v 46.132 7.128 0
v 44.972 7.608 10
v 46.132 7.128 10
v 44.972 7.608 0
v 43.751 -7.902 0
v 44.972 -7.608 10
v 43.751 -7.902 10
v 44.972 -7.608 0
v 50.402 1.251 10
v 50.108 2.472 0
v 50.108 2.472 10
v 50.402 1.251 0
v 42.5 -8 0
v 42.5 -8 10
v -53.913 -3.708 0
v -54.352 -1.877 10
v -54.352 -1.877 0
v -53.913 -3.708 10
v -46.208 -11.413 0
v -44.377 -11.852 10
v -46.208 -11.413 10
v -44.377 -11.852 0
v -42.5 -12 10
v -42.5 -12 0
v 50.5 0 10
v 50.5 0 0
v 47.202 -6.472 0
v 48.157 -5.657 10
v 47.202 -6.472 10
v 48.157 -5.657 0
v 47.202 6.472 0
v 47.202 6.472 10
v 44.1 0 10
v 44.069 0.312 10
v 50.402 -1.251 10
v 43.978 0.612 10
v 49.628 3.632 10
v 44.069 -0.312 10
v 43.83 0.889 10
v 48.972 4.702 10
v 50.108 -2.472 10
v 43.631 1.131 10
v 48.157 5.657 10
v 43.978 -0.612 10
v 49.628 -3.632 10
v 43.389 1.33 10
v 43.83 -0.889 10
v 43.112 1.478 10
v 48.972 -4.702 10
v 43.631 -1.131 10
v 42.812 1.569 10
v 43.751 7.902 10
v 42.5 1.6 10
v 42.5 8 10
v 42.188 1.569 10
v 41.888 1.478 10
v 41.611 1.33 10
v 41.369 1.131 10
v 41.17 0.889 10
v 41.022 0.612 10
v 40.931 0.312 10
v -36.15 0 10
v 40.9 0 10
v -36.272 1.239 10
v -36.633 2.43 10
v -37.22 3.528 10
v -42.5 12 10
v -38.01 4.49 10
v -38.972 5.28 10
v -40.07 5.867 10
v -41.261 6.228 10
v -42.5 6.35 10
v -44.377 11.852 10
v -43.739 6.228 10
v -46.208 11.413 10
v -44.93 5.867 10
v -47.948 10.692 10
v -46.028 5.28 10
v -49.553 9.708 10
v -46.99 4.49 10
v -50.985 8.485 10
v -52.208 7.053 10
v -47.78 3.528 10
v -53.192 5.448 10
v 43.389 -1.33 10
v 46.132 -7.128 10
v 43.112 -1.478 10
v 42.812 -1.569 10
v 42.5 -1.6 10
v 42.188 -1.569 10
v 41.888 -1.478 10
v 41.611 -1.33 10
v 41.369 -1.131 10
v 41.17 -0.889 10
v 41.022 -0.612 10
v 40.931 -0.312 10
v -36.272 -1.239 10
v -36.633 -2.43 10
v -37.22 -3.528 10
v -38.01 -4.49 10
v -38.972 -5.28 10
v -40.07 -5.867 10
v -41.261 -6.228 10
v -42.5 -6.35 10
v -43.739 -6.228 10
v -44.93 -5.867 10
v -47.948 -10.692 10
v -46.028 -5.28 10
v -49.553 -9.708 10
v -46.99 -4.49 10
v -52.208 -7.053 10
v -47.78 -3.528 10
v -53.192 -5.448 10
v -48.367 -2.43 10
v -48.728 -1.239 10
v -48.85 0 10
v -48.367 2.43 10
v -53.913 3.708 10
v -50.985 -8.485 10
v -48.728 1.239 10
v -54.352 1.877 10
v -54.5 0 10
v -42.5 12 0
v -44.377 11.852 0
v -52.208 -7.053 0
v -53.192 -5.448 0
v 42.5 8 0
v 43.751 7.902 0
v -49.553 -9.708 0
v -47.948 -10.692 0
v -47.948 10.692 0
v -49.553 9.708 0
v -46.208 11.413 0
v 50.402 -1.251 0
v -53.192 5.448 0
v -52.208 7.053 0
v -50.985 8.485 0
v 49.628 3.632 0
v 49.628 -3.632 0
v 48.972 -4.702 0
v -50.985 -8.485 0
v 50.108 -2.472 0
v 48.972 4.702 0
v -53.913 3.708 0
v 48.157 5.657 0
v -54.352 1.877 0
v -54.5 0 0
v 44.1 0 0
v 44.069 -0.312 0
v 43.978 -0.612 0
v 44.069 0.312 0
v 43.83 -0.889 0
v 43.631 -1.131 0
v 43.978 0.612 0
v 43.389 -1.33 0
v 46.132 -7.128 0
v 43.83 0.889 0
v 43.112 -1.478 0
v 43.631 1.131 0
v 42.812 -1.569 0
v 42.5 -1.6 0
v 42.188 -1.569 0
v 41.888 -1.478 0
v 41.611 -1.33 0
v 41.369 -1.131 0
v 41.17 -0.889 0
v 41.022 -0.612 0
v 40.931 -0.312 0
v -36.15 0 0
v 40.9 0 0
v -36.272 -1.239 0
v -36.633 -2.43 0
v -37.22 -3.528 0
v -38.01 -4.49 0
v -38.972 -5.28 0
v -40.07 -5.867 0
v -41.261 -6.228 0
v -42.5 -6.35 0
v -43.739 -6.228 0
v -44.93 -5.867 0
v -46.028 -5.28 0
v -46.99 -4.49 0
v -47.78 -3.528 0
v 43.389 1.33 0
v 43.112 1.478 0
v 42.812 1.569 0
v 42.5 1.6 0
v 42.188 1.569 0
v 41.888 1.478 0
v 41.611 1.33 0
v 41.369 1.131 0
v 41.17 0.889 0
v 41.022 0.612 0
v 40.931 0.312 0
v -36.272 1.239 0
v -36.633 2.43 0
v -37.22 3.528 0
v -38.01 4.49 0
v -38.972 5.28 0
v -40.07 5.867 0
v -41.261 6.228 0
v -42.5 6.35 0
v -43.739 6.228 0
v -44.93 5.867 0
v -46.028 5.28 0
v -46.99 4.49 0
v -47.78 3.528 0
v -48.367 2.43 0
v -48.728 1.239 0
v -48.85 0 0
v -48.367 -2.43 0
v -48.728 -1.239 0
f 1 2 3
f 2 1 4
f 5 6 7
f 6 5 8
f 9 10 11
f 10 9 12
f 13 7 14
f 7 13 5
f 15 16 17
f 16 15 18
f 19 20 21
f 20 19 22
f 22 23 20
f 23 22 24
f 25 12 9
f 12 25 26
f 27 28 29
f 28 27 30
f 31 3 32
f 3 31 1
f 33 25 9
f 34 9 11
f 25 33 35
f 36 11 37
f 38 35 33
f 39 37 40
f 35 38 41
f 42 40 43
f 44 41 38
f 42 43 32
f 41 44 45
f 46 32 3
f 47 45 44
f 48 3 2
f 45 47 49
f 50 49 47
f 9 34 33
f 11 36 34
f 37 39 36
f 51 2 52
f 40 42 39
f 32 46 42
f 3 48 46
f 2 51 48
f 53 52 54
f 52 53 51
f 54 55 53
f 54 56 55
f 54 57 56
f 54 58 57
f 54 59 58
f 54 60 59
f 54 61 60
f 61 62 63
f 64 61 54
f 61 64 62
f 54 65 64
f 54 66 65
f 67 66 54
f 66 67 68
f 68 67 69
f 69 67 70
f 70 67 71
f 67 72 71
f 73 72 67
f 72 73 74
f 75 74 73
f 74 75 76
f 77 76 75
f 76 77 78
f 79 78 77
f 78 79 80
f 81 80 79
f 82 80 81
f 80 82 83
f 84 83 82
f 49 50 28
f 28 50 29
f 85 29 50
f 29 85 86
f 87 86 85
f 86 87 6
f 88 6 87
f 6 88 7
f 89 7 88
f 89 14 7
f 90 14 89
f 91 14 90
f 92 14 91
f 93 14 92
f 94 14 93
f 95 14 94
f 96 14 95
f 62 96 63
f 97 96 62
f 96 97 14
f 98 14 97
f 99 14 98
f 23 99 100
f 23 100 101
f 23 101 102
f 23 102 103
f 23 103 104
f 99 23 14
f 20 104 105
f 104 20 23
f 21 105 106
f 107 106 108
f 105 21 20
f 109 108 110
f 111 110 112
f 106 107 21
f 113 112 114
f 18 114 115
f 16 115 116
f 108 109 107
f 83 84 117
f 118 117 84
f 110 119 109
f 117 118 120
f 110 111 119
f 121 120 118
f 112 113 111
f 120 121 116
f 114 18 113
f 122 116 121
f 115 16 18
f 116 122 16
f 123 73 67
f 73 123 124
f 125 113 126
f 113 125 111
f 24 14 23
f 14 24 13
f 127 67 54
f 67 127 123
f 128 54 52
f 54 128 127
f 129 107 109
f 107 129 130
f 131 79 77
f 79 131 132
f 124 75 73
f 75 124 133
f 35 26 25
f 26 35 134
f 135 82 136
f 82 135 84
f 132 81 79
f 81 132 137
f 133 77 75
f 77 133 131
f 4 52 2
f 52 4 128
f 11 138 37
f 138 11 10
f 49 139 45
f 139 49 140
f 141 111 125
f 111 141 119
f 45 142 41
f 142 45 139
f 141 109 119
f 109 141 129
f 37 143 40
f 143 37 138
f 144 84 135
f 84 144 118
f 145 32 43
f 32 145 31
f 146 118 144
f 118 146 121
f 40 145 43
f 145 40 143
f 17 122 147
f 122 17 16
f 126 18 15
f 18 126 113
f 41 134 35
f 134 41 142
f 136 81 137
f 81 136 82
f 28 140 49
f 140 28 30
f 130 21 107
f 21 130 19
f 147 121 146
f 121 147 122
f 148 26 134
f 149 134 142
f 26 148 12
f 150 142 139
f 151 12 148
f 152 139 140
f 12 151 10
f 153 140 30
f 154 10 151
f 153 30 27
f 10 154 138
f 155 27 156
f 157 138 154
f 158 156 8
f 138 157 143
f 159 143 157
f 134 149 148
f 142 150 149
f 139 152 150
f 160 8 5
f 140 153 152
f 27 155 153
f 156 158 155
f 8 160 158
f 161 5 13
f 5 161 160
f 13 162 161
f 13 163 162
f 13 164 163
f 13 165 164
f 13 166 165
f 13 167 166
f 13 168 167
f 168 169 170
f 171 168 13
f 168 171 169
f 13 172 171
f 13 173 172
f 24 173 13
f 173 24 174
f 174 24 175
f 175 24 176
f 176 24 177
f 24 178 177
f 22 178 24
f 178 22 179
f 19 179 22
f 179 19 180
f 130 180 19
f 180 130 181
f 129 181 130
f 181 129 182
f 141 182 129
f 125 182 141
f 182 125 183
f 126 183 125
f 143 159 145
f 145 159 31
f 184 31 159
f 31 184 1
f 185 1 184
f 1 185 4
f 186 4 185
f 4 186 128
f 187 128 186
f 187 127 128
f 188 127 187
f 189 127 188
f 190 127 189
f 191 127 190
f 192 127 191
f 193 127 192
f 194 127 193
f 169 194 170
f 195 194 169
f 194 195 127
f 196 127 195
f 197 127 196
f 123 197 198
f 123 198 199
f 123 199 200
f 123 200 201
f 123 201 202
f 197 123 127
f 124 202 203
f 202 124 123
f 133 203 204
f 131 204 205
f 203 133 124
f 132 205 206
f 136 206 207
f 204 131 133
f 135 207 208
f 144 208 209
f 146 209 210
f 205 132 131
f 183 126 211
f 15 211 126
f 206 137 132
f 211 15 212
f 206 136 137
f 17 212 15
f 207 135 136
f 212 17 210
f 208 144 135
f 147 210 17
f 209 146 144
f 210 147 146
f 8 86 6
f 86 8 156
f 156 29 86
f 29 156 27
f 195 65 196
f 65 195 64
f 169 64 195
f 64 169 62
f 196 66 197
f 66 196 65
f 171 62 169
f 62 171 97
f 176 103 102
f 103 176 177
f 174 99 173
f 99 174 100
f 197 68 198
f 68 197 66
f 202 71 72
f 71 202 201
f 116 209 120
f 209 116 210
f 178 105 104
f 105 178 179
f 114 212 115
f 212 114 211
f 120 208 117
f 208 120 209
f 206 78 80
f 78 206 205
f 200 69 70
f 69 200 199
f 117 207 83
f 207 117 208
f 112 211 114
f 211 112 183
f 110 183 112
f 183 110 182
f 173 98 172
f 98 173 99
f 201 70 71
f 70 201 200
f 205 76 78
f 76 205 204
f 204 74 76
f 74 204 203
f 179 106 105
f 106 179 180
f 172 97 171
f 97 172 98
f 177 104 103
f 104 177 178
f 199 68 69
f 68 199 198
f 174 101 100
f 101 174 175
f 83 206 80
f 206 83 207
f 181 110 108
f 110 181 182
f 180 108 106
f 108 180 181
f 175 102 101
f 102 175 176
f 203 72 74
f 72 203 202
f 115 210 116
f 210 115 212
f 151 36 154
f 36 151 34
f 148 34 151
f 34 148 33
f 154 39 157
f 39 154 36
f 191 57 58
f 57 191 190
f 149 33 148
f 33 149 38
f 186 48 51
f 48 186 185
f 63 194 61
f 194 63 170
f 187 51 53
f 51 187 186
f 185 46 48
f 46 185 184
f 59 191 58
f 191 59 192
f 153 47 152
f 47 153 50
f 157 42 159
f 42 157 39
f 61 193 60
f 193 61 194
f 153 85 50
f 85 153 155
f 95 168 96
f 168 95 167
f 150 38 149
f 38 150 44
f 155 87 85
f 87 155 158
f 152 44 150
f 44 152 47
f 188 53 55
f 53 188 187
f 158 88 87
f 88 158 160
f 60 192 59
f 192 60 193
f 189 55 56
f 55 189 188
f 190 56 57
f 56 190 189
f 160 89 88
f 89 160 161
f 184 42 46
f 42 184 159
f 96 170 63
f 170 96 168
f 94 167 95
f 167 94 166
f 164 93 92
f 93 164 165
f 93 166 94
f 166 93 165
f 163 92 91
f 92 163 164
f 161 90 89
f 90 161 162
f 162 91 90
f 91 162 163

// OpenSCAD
$fn = 32;

// ----------------------------------------------------------------------
// Lever: 85 mm between the bosses, 10 mm thick, smooth outline
// ----------------------------------------------------------------------

// --- parameters (mm) ---
lever_l = 85;             // distance between the boss centres
boss_a = 24;              // first boss diameter
boss_b = 16;              // second boss diameter
bore_a = 12.7;            // first bore
bore_b = 3.2;             // second bore
lever_t = 10;             // lever thickness

lever_profile = [[-54.5, 0], [-54.352, -1.877], [-53.913, -3.708], [-53.192, -5.448], [-52.208, -7.053], [-50.985, -8.485], [-49.553, -9.708], [-47.948, -10.692], [-46.208, -11.413], [-44.377, -11.852], [-42.5, -12], [42.5, -8], [43.751, -7.902], [44.972, -7.608], [46.132, -7.128], [47.202, -6.472], [48.157, -5.657], [48.972, -4.702], [49.628, -3.632], [50.108, -2.472], [50.402, -1.251], [50.5, 0], [50.402, 1.251], [50.108, 2.472], [49.628, 3.632], [48.972, 4.702], [48.157, 5.657], [47.202, 6.472], [46.132, 7.128], [44.972, 7.608], [43.751, 7.902], [42.5, 8], [-42.5, 12], [-44.377, 11.852], [-46.208, 11.413], [-47.948, 10.692], [-49.553, 9.708], [-50.985, 8.485], [-52.208, 7.053], [-53.192, 5.448], [-53.913, 3.708], [-54.352, 1.877]];

difference() {
  linear_extrude(height = lever_t) polygon(lever_profile);
  translate([-42.5, 0, -2.5]) cylinder(h = lever_t + 5, d = bore_a);
  translate([42.5, 0, -2.5]) cylinder(h = lever_t + 5, d = bore_b);
}
